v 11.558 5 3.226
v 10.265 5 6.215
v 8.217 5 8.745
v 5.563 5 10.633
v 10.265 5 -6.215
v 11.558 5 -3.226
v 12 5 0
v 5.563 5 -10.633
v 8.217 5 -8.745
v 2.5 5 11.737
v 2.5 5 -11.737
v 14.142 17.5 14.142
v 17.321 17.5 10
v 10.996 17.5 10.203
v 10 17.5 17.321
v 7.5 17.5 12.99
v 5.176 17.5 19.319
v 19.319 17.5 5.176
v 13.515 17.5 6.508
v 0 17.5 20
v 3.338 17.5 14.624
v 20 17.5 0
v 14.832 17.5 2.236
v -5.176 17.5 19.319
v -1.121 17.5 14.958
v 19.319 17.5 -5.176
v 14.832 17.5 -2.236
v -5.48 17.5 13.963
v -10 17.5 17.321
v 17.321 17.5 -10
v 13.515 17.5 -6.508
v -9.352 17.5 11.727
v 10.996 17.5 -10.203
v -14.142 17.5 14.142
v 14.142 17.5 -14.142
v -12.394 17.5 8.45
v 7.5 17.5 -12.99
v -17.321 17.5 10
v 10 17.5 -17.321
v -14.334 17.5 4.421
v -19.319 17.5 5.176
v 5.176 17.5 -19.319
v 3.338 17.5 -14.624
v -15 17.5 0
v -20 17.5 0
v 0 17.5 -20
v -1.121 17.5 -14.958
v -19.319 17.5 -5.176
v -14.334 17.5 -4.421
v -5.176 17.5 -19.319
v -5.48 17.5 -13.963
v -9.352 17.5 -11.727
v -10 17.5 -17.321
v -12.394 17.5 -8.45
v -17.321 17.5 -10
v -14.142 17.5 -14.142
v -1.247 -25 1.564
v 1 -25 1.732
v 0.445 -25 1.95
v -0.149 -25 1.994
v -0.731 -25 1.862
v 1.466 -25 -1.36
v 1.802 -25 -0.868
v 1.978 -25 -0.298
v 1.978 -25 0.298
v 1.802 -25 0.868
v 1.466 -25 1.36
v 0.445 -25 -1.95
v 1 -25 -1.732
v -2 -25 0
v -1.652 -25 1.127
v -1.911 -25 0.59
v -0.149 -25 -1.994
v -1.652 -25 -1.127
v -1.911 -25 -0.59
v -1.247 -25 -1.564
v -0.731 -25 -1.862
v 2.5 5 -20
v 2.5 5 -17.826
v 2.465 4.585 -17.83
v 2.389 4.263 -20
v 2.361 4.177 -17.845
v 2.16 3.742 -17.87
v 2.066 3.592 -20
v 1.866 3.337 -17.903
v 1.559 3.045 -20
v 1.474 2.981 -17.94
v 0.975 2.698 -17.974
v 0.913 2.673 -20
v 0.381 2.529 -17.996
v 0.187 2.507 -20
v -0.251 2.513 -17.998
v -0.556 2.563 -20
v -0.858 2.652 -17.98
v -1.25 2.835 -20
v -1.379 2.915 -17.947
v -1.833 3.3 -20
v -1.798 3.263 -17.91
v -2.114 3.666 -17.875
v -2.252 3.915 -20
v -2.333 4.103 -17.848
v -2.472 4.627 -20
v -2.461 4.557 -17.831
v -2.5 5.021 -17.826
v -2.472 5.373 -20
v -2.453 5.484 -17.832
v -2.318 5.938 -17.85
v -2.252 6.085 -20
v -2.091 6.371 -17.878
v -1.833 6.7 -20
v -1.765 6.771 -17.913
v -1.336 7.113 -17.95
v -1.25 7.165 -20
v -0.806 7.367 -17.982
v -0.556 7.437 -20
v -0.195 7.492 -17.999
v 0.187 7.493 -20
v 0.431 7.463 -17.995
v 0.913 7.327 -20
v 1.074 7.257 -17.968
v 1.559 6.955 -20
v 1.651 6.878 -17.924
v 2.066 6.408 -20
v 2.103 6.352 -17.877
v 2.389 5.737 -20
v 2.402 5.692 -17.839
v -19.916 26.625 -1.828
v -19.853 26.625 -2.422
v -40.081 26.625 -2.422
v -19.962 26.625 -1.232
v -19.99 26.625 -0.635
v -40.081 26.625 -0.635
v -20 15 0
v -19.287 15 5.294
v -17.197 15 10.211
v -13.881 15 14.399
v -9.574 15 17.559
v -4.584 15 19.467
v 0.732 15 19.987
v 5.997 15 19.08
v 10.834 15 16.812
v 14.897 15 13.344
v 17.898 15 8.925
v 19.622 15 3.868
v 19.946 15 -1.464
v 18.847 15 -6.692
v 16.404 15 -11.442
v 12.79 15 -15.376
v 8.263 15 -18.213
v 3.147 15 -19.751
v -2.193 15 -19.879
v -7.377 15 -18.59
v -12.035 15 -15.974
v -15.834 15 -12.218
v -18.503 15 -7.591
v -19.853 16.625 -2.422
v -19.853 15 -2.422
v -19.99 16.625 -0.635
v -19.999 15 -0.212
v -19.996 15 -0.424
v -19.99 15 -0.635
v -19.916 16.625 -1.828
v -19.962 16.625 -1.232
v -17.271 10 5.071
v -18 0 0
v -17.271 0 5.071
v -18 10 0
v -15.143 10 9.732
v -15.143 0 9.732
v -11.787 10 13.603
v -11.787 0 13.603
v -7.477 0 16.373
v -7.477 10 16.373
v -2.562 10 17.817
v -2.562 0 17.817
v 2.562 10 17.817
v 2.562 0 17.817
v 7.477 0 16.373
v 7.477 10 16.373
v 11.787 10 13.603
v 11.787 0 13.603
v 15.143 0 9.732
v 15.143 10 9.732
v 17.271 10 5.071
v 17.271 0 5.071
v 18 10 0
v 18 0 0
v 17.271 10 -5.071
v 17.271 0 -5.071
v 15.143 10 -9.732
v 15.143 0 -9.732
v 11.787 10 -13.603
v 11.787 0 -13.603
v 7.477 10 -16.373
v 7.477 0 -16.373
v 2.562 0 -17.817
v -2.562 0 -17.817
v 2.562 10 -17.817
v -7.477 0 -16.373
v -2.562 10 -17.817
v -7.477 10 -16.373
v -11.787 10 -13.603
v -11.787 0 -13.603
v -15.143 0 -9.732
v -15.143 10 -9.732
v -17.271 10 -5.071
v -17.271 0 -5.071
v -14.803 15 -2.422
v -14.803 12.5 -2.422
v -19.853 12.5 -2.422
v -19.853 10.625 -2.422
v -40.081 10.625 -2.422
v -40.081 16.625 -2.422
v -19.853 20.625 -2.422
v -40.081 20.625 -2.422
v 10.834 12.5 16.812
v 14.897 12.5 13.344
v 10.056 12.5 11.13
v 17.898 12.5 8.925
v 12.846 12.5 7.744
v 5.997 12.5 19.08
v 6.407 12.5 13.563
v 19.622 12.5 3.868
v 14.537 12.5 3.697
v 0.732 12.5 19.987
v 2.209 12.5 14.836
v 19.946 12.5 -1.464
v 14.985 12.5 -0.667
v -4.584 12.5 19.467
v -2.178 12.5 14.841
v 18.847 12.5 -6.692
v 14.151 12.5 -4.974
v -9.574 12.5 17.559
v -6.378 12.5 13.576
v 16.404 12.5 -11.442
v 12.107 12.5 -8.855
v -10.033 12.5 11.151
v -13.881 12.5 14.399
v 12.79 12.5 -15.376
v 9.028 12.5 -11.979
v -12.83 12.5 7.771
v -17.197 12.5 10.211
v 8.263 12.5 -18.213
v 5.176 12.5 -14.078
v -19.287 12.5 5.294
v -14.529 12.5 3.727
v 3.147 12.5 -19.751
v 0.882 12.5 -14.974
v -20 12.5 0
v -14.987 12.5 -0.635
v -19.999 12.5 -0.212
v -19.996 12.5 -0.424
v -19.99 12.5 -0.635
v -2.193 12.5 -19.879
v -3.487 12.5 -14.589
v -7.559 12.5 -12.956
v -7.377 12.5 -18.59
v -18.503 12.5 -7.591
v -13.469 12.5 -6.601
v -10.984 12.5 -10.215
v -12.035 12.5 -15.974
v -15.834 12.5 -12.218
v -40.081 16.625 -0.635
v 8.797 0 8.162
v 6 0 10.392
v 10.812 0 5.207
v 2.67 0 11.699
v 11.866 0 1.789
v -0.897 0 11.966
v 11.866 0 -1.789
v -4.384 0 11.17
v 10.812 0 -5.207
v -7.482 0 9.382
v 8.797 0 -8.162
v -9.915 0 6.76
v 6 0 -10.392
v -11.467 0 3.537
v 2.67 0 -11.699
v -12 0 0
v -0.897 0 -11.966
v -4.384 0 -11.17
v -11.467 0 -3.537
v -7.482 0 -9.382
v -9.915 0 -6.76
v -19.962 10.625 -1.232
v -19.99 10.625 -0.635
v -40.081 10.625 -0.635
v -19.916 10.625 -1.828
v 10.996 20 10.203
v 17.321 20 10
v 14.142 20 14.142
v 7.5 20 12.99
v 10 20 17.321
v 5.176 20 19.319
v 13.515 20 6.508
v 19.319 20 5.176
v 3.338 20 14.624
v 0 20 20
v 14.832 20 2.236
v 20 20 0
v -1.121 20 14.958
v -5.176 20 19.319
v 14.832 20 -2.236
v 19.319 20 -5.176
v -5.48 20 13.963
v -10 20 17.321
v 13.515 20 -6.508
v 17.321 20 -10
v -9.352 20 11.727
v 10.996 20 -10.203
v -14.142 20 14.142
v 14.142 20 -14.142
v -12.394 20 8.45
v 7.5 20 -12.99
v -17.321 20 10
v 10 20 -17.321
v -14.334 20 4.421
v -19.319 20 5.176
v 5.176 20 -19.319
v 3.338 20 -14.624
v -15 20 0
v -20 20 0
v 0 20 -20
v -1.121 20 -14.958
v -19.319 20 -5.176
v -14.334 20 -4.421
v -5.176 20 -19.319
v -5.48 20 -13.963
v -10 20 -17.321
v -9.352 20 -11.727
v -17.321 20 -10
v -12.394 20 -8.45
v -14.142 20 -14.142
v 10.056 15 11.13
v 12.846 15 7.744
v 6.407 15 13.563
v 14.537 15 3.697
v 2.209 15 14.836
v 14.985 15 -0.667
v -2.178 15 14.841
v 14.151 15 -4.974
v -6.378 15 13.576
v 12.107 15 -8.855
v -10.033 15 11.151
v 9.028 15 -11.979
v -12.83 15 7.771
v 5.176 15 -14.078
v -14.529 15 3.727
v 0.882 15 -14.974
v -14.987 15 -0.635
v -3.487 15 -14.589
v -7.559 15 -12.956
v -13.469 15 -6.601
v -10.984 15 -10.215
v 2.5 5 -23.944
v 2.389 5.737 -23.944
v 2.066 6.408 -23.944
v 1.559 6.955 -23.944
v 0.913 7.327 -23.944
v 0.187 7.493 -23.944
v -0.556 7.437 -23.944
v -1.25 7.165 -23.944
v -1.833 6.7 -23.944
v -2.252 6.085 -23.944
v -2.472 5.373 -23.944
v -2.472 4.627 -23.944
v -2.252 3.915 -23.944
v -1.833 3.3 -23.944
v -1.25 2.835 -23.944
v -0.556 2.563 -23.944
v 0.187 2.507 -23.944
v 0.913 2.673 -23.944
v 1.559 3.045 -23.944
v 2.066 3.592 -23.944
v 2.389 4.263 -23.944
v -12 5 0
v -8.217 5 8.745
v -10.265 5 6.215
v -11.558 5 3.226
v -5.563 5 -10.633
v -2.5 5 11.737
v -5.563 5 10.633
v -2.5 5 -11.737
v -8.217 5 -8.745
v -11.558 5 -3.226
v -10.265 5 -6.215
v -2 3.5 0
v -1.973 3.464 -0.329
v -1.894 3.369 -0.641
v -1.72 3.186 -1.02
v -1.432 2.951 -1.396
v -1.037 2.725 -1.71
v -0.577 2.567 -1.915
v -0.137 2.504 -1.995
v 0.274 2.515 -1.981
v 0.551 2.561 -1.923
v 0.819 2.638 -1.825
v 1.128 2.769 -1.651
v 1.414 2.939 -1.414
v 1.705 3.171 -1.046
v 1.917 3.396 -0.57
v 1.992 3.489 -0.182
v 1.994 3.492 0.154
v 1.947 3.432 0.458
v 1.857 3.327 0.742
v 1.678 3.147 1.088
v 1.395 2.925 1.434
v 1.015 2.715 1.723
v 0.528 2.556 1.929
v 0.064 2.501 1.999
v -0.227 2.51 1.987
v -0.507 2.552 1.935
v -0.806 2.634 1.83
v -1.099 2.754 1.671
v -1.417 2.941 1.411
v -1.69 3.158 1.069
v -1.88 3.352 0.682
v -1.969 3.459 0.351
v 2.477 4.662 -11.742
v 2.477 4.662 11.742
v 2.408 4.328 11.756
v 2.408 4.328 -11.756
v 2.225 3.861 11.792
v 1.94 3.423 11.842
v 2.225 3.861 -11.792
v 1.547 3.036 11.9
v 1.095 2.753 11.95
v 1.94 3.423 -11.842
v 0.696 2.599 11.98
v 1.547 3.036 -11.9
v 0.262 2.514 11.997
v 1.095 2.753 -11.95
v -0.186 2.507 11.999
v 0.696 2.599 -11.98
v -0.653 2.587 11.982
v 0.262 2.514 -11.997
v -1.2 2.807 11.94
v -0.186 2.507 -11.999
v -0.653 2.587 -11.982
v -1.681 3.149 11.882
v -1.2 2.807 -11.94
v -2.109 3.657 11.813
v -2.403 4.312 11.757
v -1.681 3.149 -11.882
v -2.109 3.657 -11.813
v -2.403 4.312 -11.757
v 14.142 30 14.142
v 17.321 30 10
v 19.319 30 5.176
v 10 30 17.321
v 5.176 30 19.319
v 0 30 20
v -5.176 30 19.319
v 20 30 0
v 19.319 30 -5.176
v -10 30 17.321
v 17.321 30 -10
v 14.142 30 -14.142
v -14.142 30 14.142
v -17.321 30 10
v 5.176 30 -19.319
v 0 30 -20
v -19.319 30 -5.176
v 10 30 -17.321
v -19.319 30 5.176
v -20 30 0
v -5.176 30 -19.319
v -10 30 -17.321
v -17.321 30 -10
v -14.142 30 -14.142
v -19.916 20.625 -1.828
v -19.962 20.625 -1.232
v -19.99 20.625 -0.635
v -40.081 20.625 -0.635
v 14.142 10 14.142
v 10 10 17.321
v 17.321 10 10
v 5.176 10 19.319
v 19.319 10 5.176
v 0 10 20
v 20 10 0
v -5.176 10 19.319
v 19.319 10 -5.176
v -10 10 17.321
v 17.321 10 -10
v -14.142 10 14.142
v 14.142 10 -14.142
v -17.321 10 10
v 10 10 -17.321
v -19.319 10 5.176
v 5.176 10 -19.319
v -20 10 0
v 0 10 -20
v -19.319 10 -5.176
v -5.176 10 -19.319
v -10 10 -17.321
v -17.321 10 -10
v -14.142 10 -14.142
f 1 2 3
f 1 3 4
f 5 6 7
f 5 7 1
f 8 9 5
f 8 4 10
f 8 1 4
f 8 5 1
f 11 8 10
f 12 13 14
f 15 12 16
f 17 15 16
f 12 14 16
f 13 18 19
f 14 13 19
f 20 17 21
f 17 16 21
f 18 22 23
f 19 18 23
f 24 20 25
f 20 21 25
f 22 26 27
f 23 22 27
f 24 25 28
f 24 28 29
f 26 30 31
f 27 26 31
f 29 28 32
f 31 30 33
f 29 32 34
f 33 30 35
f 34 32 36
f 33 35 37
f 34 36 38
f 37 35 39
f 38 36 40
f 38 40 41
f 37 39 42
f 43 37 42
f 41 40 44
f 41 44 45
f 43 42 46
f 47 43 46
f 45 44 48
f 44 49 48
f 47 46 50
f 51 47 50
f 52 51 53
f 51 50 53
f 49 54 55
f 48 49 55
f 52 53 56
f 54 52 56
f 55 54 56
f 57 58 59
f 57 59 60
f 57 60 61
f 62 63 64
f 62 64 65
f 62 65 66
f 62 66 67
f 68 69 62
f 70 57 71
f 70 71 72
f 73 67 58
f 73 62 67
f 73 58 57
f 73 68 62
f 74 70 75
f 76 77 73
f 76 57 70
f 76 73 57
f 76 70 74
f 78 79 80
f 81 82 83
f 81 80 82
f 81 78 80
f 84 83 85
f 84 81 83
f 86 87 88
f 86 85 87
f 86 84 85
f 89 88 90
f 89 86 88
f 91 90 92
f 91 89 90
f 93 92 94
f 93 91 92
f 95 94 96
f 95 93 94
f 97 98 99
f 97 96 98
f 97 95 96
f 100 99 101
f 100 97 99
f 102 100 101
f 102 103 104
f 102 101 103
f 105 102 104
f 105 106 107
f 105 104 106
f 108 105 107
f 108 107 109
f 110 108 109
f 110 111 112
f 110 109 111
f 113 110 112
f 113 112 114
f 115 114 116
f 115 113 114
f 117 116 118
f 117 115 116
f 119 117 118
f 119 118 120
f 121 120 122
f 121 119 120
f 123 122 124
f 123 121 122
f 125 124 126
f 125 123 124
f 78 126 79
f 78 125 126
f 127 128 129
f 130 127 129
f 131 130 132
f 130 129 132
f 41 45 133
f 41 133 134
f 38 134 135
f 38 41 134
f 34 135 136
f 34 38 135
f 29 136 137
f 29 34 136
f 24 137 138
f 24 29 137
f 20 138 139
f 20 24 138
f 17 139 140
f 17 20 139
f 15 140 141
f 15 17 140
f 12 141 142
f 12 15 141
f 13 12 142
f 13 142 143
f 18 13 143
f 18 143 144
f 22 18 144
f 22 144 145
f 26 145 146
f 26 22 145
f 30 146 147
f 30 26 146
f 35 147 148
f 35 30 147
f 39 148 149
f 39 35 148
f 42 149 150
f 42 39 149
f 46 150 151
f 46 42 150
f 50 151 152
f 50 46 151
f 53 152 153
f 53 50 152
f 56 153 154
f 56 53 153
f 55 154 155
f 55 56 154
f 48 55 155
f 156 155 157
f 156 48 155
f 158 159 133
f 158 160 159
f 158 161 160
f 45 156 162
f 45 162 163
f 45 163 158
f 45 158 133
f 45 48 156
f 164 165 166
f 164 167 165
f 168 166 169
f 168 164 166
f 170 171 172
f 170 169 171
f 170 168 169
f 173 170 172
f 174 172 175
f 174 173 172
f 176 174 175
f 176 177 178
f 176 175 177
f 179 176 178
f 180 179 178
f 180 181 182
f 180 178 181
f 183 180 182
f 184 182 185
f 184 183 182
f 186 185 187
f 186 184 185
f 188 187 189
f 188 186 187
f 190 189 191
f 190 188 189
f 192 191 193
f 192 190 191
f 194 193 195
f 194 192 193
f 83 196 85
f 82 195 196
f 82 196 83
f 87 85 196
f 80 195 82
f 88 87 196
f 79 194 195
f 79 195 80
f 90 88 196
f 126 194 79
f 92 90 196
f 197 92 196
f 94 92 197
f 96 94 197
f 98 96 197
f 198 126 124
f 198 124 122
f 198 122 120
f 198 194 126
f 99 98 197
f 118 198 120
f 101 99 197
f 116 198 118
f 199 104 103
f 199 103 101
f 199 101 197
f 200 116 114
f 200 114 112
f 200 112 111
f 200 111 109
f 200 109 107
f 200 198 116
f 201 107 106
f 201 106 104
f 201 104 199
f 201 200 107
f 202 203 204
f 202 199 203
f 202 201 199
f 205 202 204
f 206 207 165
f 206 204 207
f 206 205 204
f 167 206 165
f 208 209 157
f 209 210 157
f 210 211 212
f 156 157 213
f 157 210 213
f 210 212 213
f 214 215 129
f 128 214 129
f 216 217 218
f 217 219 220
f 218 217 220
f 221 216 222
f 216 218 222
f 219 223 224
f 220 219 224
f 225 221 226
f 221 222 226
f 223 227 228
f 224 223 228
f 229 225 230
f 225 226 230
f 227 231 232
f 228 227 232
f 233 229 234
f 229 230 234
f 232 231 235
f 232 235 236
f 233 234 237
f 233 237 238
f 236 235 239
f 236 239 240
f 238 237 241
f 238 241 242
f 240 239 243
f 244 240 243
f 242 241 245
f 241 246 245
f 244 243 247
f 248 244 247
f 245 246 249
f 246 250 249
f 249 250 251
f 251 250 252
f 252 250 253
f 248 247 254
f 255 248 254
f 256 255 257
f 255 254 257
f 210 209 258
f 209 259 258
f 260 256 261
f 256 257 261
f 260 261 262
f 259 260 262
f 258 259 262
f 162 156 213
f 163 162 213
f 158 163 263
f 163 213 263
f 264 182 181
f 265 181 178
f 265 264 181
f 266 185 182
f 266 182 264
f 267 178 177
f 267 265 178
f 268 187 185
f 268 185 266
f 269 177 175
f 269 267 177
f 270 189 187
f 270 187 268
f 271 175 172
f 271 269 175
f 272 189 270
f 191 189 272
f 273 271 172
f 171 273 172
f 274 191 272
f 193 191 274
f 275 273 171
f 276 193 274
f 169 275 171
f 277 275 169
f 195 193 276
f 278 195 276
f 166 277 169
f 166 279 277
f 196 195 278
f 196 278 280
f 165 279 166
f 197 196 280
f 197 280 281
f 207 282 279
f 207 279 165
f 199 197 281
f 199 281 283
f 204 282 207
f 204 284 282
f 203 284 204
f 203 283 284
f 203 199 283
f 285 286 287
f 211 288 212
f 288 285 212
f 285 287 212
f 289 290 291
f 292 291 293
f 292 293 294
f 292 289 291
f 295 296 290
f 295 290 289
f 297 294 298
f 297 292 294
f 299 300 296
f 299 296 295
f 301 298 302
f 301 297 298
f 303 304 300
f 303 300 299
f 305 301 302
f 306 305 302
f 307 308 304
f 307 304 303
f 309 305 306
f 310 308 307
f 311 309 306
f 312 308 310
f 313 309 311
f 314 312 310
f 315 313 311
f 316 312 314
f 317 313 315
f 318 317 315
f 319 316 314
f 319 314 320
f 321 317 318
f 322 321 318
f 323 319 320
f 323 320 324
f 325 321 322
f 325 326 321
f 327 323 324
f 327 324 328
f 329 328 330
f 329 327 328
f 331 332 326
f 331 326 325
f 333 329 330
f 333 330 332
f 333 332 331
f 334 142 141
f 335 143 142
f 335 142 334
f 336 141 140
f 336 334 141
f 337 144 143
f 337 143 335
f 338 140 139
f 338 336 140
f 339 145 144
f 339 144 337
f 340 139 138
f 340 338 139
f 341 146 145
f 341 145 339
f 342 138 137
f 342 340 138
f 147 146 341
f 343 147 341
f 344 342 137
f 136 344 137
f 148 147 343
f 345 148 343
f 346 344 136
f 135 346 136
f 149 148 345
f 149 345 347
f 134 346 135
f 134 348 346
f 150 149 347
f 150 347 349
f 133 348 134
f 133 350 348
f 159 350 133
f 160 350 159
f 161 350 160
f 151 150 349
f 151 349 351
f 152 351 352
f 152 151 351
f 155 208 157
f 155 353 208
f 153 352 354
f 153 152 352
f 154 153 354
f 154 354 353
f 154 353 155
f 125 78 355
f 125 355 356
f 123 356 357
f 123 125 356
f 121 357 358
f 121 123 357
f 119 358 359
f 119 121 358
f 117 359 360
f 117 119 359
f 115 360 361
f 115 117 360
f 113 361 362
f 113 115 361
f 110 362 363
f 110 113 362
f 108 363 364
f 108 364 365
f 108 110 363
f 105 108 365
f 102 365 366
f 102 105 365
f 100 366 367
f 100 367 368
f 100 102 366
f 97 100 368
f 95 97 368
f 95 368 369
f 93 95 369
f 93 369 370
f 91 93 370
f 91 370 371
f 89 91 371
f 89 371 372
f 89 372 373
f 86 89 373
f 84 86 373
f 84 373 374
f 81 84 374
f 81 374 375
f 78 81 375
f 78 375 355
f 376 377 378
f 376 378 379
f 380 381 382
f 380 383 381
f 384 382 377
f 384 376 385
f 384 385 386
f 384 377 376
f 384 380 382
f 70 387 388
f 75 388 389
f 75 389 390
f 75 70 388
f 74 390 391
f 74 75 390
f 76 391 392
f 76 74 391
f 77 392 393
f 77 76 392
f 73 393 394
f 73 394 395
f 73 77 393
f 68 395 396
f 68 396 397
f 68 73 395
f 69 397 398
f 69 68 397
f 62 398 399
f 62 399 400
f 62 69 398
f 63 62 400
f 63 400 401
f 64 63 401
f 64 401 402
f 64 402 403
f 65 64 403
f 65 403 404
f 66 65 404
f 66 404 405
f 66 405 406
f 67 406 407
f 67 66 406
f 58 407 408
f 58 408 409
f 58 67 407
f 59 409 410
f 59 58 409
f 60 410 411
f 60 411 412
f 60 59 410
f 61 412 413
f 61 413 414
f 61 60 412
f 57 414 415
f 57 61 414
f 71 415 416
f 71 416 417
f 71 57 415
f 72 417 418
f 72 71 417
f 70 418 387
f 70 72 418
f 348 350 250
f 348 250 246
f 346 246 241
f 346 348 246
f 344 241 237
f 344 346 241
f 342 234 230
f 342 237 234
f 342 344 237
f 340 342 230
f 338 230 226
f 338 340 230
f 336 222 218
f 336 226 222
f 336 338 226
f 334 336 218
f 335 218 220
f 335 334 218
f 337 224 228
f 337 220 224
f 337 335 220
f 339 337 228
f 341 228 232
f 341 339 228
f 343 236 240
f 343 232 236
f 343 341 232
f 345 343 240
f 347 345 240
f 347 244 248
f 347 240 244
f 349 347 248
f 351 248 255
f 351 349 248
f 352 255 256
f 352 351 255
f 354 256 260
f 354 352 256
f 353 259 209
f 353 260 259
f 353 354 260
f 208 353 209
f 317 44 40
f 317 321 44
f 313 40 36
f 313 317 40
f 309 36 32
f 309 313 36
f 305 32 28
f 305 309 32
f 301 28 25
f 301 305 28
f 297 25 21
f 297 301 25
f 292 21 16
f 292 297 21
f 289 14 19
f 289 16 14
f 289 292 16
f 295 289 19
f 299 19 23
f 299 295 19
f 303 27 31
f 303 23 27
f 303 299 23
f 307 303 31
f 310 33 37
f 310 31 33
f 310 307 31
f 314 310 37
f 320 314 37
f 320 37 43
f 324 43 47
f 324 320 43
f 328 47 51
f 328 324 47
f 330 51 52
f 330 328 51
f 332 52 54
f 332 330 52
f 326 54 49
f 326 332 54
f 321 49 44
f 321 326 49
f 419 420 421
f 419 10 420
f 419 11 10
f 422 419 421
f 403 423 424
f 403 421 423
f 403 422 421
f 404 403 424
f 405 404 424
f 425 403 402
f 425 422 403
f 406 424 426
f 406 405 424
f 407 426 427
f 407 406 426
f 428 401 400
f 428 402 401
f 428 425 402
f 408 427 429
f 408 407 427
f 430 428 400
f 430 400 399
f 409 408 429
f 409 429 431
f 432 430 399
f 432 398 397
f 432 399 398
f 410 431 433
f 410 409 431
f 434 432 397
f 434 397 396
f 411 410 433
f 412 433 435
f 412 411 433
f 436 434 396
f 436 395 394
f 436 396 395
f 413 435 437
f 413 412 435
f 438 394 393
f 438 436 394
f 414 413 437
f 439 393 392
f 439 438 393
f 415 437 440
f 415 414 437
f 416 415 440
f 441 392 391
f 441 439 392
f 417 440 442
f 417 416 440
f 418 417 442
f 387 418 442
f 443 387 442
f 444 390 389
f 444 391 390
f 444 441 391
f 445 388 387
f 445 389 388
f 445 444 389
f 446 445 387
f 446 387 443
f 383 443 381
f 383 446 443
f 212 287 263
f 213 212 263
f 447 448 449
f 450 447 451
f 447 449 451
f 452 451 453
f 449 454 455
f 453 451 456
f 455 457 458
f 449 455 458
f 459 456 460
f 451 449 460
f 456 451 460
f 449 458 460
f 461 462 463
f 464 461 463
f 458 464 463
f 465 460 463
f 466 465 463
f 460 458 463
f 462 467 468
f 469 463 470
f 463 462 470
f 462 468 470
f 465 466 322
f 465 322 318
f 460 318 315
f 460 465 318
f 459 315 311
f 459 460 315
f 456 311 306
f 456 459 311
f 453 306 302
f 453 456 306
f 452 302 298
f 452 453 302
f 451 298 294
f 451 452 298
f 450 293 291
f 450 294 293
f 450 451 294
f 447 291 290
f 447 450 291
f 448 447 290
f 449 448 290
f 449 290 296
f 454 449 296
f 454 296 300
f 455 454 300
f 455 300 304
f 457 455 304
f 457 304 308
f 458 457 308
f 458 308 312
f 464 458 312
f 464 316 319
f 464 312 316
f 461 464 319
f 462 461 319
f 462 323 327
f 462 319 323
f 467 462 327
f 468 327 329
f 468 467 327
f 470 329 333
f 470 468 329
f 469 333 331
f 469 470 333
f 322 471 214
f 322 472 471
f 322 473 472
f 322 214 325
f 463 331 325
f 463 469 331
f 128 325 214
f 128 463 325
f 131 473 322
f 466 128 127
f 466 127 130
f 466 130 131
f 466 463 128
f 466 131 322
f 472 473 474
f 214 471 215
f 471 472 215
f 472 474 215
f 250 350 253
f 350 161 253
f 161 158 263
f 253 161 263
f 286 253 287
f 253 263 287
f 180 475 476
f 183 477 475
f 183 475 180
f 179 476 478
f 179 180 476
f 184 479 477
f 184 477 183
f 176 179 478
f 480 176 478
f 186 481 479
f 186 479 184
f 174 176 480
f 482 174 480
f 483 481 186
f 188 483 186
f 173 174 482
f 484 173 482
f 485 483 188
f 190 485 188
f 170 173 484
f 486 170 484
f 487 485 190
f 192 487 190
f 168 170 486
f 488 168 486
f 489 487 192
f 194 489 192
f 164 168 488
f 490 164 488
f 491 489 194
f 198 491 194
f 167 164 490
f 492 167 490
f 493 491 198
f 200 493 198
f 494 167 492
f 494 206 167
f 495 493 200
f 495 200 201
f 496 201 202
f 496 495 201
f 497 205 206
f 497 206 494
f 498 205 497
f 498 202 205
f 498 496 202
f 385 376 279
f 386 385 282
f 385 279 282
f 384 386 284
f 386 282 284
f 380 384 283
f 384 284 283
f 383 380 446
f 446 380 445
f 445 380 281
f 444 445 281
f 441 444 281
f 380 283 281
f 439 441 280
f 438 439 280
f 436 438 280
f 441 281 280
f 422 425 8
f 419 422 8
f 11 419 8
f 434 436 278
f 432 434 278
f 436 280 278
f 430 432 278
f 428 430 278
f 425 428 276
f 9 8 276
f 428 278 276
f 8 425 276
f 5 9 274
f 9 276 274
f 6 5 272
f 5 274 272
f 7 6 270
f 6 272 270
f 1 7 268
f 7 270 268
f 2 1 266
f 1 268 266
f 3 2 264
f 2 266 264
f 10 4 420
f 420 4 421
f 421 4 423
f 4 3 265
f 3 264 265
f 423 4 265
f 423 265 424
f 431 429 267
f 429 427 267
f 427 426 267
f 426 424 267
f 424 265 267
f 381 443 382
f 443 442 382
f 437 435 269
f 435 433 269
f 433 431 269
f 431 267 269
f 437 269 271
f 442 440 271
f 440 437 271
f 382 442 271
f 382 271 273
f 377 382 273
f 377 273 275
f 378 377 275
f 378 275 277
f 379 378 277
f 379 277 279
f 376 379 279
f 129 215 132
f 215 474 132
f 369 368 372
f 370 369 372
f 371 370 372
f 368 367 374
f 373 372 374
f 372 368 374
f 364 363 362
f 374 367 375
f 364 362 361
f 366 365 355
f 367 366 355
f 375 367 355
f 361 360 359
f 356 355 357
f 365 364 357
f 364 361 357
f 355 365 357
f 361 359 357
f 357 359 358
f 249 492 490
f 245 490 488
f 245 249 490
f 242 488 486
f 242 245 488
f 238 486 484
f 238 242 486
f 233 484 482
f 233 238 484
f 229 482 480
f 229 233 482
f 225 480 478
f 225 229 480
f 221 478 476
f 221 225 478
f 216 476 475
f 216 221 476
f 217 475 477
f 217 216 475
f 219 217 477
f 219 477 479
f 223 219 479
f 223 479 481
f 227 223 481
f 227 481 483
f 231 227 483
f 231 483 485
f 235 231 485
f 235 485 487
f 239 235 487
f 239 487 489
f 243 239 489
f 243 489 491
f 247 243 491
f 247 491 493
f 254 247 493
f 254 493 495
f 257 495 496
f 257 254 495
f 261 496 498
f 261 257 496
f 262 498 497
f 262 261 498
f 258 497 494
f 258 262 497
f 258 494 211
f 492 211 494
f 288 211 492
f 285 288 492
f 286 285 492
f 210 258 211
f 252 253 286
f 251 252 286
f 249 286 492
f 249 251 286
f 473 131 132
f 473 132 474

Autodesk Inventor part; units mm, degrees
ref_plane "XZ Plane" through (0, 0, 0) normal (0, 1, 0) x (-1, 0, 0)
sketch "Sketch1" plane through (0, 0, 0) normal (0, 0, 1) x (1, 0, 0)
  line L0 (-18, 0) -> (-18, 10)
  line L1 (-18, 10) -> (-20, 10)
  line L2 (-20, 10) -> (-20, 12.5)
  line L3 (-20, 12.5) -> (-15, 12.5)
  line L4 (-15, 12.5) -> (-15, 15)
  line L5 (-15, 15) -> (-20, 15)
  line L6 (-20, 15) -> (-20, 17.5)
  line L7 (-20, 17.5) -> (-15, 17.5)
  line L8 (-15, 17.5) -> (-15, 20)
  line L9 (-15, 20) -> (-20, 20)
  line L10 (-20, 20) -> (-20, 30)
  line L11 (-20, 30) -> (0, 30)
  line L12 (0, 30) -> (0, 0)
  line L13 (-18, 0) -> (-12, 0)
  line L14 (-12, 5) -> (-2, 5)
  line L15 (-12, 0) -> (-18, 0)
  line L16 (-2, -25) -> (0, -25)
  line L17 (0, 0) -> (0, -25)
  line L18 (-2, 5) -> (-2, -25)
  line L19 (-12, 5) -> (-12, 0)
  dimension "d0" = 2.5
  dimension "d1" = 20
  dimension "d3" = 5
  dimension "d4" = 10
  dimension "d22" = 10
  dimension "d24" = 30
  dimension "d26" = 2
  dimension "d27" = 25
  dimension "d28" = 10
  dimension "d29" = 30
  dimension "d30" = 18
revolve "Revolution1" add sketch "Sketch1" angle 360 about axis through (0, 30, 0) along (0, -1, 0)
ref_plane "Work Plane4" through (-20, 16.25, 0) normal (1, 0, 0) x (0, 1, 0)
sketch "Sketch6" plane through (-20, 16.25, 0) normal (1, 0, 0) x (0, 1, 0)
  line L0 (4.3754, -2.422) -> (10.3754, -2.422)
  line L1 (10.3754, -2.422) -> (10.3754, -0.6353)
  line L2 (10.3754, -0.6353) -> (4.3754, -0.6353)
  line L3 (4.3754, -0.6353) -> (4.3754, -2.422)
  line L4 (0.3754, -0.6353) -> (-5.6246, -0.6353)
  line L5 (-5.6246, -0.6353) -> (-5.6246, -2.422)
  line L6 (-5.6246, -2.422) -> (0.3754, -2.422)
  line L7 (0.3754, -2.422) -> (0.3754, -0.6353)
  line L8 (-830.9186, 0) -> (19.0814, 0) projected
  point P0 (0, 0)
  dimension "d39" = 6
  dimension "d40" = 6
  dimension "d41" = 10
  dimension "d42" = 1.7867
  dimension "d43" = 1.7867
  dimension "d44" = 10.3753
  dimension "d45" = 0.6353
  dimension "d46" = 0.6353
  dimension "d47" = 8.706
extrude "Extrusion2" add sketch "Sketch6" along normal blind 21.1125 and the other way blind 20.081
ref_plane "Work Plane5" through (0, 25, -20) normal (0, 0, 1) x (1, 0, 0)
sketch "Sketch7" plane through (0, 25, -20) normal (0, 0, 1) x (1, 0, 0)
  circle A0 centre (0, -20) radius 2.5
  point P0 (0, -25)
  dimension "d48" = 5
  dimension "d49" = 5
extrude "Extrusion3" add sketch "Sketch7" along normal blind 36.4625 and the other way blind 3.944
properties part number "BallHolder"
